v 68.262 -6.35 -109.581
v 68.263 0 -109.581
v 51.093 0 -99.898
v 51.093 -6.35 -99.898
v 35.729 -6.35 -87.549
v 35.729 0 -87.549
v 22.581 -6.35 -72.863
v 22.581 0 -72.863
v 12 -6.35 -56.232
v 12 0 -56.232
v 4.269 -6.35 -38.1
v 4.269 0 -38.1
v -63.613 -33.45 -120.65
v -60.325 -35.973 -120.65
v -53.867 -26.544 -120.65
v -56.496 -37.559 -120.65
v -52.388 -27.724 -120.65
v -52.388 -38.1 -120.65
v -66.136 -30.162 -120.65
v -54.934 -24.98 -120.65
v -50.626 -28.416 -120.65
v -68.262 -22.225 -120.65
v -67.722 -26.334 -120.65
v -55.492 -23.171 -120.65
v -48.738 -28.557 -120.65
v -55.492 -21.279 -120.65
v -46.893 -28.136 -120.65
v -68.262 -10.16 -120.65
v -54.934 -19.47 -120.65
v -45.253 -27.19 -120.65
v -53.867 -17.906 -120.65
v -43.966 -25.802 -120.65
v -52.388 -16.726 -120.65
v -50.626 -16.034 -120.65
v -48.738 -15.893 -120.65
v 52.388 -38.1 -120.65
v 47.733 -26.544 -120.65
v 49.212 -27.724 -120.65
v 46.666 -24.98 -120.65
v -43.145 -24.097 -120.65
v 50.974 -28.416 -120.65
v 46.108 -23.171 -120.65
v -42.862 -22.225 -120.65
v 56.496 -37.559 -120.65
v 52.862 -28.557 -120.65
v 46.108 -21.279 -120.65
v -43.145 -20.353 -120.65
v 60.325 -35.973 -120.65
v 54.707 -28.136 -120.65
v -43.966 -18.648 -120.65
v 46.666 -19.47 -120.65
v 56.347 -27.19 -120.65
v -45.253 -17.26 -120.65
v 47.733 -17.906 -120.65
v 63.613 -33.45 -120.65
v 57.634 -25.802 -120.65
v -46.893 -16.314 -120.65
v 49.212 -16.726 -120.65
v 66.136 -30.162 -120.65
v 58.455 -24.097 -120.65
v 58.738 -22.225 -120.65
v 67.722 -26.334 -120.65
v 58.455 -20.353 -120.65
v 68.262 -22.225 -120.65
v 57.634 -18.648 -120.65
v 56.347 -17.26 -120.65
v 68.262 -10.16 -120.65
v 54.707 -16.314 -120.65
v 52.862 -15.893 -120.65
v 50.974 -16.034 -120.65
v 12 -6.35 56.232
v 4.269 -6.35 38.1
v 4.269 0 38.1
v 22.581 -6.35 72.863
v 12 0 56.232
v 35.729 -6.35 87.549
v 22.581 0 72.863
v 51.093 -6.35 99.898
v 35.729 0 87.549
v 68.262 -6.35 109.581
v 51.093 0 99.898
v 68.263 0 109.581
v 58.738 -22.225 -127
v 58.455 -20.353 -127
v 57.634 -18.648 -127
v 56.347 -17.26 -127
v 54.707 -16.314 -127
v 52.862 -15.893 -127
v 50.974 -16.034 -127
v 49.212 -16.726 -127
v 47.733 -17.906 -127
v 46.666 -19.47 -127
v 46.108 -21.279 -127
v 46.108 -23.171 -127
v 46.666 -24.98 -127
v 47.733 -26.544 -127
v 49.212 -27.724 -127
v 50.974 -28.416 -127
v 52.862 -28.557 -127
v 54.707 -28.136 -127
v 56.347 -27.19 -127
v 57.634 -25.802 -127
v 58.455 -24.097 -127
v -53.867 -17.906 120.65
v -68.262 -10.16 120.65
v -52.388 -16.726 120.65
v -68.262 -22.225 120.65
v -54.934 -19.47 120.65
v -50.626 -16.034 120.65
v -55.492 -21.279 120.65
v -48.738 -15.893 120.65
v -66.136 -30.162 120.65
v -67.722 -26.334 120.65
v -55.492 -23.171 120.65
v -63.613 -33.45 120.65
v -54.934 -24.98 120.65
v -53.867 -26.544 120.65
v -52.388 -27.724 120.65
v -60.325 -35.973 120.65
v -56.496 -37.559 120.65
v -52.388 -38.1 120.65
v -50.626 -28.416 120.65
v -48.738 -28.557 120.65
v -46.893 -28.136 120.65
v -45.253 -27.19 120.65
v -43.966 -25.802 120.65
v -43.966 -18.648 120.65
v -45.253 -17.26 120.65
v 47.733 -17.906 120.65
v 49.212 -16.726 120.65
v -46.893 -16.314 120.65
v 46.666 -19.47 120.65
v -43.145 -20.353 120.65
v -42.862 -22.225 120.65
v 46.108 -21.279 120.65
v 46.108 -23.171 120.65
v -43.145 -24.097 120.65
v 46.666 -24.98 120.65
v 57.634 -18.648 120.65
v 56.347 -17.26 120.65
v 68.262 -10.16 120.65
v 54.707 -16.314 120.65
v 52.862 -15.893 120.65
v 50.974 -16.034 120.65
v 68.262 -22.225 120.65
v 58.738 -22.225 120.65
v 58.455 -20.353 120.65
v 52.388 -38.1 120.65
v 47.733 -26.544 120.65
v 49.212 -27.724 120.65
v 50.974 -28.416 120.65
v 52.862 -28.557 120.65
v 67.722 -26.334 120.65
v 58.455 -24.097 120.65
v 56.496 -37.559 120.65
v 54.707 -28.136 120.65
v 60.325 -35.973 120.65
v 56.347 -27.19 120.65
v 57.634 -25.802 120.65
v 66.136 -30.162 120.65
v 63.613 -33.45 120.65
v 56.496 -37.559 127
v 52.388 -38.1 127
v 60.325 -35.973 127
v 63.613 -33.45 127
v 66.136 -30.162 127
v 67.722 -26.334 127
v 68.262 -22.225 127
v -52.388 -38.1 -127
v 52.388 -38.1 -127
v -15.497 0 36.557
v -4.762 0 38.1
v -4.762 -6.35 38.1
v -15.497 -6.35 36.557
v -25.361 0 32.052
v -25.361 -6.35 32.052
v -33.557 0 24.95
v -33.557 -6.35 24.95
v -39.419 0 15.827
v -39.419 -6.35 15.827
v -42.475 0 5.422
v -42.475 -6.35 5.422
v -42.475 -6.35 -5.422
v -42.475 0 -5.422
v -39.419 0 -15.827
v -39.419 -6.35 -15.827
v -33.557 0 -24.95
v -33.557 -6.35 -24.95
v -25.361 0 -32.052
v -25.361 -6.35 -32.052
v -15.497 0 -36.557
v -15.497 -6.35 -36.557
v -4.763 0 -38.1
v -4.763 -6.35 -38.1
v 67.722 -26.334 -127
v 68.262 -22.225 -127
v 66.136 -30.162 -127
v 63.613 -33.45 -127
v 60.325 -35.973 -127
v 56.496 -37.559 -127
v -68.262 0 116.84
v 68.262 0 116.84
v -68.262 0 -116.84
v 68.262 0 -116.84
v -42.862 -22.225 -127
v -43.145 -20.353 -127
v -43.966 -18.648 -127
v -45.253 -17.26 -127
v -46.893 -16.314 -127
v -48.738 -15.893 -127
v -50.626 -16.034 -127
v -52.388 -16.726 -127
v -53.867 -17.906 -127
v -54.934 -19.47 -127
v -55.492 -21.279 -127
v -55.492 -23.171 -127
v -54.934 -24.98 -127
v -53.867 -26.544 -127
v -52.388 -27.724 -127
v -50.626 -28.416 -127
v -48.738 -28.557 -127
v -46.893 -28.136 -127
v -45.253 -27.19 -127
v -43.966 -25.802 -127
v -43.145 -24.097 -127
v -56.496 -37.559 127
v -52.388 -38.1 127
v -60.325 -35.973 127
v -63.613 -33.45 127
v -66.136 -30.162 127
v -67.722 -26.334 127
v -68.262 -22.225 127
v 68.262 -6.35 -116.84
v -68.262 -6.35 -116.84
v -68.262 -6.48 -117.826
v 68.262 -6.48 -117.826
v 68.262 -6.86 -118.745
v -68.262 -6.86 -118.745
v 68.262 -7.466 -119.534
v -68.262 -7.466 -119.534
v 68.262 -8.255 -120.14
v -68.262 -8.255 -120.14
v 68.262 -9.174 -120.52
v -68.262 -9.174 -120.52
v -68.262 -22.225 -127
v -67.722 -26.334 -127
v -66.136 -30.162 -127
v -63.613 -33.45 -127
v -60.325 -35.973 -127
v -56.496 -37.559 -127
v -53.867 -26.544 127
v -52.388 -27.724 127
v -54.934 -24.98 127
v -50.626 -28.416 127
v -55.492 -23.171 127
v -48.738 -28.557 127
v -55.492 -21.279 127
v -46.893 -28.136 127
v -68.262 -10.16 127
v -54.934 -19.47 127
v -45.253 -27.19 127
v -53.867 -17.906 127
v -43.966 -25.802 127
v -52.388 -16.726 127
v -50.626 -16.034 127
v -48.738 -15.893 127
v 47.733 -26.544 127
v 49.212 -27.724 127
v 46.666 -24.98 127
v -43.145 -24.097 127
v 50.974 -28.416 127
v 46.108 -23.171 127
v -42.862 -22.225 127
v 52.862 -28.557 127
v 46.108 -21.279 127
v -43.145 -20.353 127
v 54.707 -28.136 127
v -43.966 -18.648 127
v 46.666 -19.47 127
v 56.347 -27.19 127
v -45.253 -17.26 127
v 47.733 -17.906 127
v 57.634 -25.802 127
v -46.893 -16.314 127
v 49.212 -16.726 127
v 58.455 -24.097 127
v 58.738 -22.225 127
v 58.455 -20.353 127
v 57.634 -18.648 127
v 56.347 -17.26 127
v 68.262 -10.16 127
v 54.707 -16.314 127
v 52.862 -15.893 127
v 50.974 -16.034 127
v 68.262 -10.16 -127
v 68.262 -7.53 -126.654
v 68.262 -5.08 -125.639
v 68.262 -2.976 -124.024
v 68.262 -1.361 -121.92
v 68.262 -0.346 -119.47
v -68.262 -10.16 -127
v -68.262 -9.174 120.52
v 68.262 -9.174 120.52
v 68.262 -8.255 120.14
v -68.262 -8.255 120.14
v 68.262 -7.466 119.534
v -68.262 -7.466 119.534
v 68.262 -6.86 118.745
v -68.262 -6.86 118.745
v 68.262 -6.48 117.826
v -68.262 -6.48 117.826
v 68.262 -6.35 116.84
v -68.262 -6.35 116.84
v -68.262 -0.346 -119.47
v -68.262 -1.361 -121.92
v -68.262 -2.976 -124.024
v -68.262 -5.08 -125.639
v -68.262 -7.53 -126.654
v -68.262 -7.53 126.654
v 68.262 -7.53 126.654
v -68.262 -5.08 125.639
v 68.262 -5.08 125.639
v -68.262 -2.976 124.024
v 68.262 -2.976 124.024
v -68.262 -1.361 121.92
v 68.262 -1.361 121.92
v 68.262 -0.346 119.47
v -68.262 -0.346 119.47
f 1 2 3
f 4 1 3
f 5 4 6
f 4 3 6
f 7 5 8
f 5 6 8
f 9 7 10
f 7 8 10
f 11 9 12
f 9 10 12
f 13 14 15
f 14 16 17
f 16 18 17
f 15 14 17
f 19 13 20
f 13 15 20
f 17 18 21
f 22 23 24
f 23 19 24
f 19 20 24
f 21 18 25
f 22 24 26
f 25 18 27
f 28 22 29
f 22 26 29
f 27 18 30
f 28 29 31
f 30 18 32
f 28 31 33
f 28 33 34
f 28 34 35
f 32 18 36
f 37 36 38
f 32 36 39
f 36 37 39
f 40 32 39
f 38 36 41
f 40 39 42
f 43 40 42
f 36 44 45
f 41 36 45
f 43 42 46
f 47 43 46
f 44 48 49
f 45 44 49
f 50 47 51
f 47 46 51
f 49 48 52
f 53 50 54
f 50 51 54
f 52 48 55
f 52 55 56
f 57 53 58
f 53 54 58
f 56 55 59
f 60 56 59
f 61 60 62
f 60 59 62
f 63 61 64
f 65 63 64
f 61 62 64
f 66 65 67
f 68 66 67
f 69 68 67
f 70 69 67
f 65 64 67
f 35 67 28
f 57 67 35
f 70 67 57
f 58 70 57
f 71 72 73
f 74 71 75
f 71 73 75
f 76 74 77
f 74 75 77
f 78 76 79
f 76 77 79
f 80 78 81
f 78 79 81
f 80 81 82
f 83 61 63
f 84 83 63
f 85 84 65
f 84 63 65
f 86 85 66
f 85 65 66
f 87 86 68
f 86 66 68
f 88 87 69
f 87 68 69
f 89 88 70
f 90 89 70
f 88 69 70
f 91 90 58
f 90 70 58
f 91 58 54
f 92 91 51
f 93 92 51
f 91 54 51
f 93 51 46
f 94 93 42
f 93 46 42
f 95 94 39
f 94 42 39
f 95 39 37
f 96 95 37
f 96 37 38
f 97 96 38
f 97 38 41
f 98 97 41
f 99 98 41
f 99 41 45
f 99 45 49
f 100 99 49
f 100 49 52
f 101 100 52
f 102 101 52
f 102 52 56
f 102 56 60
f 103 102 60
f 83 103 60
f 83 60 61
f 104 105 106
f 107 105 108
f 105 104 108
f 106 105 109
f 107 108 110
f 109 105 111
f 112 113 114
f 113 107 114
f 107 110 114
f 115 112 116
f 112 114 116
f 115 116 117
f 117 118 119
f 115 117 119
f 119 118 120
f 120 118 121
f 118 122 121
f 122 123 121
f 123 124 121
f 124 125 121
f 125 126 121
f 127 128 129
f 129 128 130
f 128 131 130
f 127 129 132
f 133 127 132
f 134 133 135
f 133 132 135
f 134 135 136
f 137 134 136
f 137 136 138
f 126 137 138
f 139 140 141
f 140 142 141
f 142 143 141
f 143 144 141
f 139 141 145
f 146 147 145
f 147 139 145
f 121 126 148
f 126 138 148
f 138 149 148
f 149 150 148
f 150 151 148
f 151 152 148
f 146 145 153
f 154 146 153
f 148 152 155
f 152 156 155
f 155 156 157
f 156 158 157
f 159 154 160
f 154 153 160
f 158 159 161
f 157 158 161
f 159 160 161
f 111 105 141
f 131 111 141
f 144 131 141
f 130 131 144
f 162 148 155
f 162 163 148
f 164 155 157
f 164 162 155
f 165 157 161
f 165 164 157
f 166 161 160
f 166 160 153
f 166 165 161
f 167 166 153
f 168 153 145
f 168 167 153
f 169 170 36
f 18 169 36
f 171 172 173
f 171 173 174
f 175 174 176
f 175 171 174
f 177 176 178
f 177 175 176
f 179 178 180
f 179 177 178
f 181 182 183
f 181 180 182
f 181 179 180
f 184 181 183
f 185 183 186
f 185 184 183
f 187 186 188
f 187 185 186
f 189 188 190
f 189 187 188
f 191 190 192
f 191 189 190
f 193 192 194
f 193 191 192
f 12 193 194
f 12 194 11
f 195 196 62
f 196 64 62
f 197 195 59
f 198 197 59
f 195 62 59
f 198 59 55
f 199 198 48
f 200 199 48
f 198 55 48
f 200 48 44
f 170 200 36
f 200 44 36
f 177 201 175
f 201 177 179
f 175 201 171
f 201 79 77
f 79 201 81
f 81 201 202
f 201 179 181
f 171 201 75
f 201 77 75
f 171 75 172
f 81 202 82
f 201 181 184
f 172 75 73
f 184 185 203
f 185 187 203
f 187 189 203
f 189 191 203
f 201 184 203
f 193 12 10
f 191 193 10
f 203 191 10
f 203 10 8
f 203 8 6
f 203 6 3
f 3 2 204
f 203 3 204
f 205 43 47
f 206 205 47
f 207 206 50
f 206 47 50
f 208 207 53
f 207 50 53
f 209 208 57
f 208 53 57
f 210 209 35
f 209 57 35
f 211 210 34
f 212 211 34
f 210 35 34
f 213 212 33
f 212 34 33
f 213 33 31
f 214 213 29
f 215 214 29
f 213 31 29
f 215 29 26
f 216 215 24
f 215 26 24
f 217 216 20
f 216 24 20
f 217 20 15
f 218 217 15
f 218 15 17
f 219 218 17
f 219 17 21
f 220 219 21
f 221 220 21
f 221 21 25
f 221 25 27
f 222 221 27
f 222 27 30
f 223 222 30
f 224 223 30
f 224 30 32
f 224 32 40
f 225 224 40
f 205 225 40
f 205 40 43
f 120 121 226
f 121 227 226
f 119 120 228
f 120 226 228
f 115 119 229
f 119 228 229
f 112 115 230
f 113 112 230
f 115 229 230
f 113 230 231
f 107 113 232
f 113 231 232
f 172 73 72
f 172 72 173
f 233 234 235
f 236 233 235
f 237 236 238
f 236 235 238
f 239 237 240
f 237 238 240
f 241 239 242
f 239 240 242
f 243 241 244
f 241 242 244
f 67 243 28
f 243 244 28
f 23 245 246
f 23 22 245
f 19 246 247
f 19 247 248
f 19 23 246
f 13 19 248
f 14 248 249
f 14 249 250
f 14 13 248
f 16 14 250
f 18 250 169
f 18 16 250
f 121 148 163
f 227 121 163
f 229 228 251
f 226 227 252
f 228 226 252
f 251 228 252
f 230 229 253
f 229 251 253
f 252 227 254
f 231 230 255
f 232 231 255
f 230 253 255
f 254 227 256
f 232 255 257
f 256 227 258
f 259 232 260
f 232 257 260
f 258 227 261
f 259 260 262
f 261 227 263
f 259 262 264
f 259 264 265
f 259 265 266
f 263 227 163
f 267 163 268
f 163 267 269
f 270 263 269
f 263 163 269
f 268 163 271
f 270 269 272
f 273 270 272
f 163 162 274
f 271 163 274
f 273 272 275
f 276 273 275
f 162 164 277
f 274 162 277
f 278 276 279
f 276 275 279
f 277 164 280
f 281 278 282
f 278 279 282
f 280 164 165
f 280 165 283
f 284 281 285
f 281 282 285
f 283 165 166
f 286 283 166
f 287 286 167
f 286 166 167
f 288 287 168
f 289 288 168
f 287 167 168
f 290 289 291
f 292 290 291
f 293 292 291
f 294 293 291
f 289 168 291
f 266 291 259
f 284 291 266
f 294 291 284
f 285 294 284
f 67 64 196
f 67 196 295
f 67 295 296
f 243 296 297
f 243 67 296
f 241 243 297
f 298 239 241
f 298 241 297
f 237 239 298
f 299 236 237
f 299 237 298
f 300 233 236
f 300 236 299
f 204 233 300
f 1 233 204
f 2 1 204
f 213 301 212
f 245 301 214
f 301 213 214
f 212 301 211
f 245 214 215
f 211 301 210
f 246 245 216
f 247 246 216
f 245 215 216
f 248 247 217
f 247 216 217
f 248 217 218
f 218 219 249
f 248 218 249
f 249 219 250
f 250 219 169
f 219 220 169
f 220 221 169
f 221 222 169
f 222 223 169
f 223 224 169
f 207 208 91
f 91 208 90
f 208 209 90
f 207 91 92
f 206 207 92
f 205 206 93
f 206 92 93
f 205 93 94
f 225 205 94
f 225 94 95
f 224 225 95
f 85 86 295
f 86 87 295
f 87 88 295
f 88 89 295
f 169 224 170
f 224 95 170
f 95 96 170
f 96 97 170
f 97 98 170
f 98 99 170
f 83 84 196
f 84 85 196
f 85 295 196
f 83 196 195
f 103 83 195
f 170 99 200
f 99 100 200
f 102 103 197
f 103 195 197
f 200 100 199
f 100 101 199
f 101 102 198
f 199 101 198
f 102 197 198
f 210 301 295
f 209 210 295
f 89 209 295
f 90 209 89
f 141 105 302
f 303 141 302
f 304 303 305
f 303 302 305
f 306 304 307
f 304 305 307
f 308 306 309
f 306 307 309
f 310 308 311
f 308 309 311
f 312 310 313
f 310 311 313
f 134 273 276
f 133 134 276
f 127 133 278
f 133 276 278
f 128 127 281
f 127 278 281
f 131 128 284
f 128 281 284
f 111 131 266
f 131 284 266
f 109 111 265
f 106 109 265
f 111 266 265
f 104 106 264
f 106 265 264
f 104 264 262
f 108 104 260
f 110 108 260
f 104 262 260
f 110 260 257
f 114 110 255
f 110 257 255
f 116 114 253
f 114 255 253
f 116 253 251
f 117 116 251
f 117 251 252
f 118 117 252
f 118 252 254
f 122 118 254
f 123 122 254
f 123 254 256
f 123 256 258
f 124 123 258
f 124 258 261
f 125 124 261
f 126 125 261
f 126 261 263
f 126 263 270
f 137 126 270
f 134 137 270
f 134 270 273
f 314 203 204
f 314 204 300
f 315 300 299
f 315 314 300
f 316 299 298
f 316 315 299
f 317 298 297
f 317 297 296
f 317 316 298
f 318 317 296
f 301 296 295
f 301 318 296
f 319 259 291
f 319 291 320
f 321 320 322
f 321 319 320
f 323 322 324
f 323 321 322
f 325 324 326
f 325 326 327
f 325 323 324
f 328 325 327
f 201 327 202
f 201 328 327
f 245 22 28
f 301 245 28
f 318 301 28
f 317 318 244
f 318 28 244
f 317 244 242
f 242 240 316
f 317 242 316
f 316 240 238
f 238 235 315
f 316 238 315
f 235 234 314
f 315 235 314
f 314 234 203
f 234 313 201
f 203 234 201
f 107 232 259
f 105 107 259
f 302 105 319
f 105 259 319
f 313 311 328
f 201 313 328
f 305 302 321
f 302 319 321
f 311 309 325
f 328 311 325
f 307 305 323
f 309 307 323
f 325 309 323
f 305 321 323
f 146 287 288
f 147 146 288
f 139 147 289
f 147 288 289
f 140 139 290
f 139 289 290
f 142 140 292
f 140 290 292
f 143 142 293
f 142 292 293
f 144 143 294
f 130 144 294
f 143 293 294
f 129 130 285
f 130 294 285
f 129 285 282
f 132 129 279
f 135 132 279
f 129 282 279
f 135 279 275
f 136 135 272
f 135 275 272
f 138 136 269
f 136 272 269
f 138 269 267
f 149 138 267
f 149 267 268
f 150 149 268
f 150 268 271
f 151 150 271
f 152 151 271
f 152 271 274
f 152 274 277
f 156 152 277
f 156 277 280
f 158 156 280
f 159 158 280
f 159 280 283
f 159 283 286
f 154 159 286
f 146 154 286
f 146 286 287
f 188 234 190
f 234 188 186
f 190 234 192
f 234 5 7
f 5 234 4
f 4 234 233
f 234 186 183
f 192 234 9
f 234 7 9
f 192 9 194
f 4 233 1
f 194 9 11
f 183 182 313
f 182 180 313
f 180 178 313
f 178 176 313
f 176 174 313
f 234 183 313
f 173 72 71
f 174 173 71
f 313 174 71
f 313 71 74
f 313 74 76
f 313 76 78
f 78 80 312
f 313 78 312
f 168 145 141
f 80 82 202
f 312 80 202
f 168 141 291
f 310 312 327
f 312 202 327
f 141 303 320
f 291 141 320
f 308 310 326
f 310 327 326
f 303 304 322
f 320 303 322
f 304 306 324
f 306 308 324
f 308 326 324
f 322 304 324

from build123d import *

# Parameters (mm, degrees)
EXTRUDE_THIN1_DEPTH    = 68.2625
SKETCH2_R              = 6.35
CUT_EXTRUDE1_DEPTH     = 266.758121054
FILLET1_R              = 15.875
CUT_EXTRUDE2_DEPTH     = 150.132085435
CONVERT_SOLID1_START   = -68.2625
CONVERT_SOLID1_DEPTH   = 136.525
CONVERT_SOLID1_2_DEPTH = 136.525
SKETCH8_R              = 120.65
CUT_EXTRUDE3_DEPTH     = 150.132085435


# Read off the part's stored shape, not the designer's step: Convert-Solid1
with BuildPart() as part:
    # Sketch1 → Extrude-Thin1 (new, symmetric)
    with BuildSketch(Plane(origin=(0, 0, 0), x_dir=(0, 0, -1), z_dir=(1, 0, 0))):
        Polygon((-127, -38.1), (-127, 0), (127, 0), (127, -38.1), (120.65, -38.1), (120.65, -6.35), (-120.65, -6.35), (-120.65, -38.1), align=None)
    extrude(amount=EXTRUDE_THIN1_DEPTH, both=True)

    # Sketch2 → Cut-Extrude1 (cut, through all)
    with BuildSketch(Plane.XY.offset(127)):
        with Locations((-49.2125, -22.225)):
            Circle(SKETCH2_R)
        with Locations((52.3875, -22.225)):
            Circle(SKETCH2_R)
    extrude(amount=-CUT_EXTRUDE1_DEPTH, mode=Mode.SUBTRACT)

    # Fillet1
    fillet1_edges = [part.edges().sort_by_distance(p)[0] for p in [
        (68.2625, -38.1, -123.825),
        (-68.2625, -38.1, -123.825),
        (68.2625, -38.1, 123.825),
        (-68.2625, -38.1, 123.825),
    ]]
    fillet(fillet1_edges, radius=FILLET1_R)

    # Sketch3 → Cut-Extrude2 (cut, through all)
    with BuildSketch(Plane(origin=(0, 0, 0), x_dir=(1, 0, 0), z_dir=(0, 1, 0))):
        with BuildLine():
            Line((-4.7625, 38.1), (68.2625, 38.1))
            Line((68.2625, 38.1), (68.2625, -38.1))
            Line((68.2625, -38.1), (-4.7625, -38.1))
            ThreePointArc((-4.7625, -38.1), (-42.8625, 0), (-4.7625, 38.1))
        make_face()
    extrude(amount=-CUT_EXTRUDE2_DEPTH, mode=Mode.SUBTRACT)

    # Convert-Solid1 outline → Convert-Solid1 (cut)
    with BuildSketch(Plane.YZ.offset(CONVERT_SOLID1_START)):
        with BuildLine():
            Line((0, -127), (0, -116.84))
            ThreePointArc((0, -116.84), (-2.975795103, -124.024204897), (-10.16, -127))
            Line((-10.16, -127), (0, -127))
        make_face()
        with BuildLine():
            ThreePointArc((-10.16, 127), (-2.975795103, 124.024204897), (0, 116.84))
            Line((0, 116.84), (0, 127))
            Line((0, 127), (-10.16, 127))
        make_face()
    extrude(amount=CONVERT_SOLID1_DEPTH, mode=Mode.SUBTRACT)

    # Convert-Solid1 2 outline → Convert-Solid1 2 (add)
    with BuildSketch(Plane.YZ.offset(CONVERT_SOLID1_START)):
        with BuildLine():
            Line((-6.35, -120.65), (-6.35, -116.84))
            ThreePointArc((-6.35, -116.84), (-7.465923164, -119.534076836), (-10.16, -120.65))
            Line((-10.16, -120.65), (-6.35, -120.65))
        make_face()
        with BuildLine():
            ThreePointArc((-10.16, 120.65), (-7.465923164, 119.534076836), (-6.35, 116.84))
            Line((-6.35, 116.84), (-6.35, 120.65))
            Line((-6.35, 120.65), (-10.16, 120.65))
        make_face()
    extrude(amount=CONVERT_SOLID1_2_DEPTH)

    # Sketch8 → Cut-Extrude3 (cut, through all)
    with BuildSketch(Plane(origin=(0, 0, 0), x_dir=(1, 0, 0), z_dir=(0, 1, 0))):
        with Locations((118.745, 0)):
            Circle(SKETCH8_R)
    extrude(amount=-CUT_EXTRUDE3_DEPTH, mode=Mode.SUBTRACT)


solid = part.part
